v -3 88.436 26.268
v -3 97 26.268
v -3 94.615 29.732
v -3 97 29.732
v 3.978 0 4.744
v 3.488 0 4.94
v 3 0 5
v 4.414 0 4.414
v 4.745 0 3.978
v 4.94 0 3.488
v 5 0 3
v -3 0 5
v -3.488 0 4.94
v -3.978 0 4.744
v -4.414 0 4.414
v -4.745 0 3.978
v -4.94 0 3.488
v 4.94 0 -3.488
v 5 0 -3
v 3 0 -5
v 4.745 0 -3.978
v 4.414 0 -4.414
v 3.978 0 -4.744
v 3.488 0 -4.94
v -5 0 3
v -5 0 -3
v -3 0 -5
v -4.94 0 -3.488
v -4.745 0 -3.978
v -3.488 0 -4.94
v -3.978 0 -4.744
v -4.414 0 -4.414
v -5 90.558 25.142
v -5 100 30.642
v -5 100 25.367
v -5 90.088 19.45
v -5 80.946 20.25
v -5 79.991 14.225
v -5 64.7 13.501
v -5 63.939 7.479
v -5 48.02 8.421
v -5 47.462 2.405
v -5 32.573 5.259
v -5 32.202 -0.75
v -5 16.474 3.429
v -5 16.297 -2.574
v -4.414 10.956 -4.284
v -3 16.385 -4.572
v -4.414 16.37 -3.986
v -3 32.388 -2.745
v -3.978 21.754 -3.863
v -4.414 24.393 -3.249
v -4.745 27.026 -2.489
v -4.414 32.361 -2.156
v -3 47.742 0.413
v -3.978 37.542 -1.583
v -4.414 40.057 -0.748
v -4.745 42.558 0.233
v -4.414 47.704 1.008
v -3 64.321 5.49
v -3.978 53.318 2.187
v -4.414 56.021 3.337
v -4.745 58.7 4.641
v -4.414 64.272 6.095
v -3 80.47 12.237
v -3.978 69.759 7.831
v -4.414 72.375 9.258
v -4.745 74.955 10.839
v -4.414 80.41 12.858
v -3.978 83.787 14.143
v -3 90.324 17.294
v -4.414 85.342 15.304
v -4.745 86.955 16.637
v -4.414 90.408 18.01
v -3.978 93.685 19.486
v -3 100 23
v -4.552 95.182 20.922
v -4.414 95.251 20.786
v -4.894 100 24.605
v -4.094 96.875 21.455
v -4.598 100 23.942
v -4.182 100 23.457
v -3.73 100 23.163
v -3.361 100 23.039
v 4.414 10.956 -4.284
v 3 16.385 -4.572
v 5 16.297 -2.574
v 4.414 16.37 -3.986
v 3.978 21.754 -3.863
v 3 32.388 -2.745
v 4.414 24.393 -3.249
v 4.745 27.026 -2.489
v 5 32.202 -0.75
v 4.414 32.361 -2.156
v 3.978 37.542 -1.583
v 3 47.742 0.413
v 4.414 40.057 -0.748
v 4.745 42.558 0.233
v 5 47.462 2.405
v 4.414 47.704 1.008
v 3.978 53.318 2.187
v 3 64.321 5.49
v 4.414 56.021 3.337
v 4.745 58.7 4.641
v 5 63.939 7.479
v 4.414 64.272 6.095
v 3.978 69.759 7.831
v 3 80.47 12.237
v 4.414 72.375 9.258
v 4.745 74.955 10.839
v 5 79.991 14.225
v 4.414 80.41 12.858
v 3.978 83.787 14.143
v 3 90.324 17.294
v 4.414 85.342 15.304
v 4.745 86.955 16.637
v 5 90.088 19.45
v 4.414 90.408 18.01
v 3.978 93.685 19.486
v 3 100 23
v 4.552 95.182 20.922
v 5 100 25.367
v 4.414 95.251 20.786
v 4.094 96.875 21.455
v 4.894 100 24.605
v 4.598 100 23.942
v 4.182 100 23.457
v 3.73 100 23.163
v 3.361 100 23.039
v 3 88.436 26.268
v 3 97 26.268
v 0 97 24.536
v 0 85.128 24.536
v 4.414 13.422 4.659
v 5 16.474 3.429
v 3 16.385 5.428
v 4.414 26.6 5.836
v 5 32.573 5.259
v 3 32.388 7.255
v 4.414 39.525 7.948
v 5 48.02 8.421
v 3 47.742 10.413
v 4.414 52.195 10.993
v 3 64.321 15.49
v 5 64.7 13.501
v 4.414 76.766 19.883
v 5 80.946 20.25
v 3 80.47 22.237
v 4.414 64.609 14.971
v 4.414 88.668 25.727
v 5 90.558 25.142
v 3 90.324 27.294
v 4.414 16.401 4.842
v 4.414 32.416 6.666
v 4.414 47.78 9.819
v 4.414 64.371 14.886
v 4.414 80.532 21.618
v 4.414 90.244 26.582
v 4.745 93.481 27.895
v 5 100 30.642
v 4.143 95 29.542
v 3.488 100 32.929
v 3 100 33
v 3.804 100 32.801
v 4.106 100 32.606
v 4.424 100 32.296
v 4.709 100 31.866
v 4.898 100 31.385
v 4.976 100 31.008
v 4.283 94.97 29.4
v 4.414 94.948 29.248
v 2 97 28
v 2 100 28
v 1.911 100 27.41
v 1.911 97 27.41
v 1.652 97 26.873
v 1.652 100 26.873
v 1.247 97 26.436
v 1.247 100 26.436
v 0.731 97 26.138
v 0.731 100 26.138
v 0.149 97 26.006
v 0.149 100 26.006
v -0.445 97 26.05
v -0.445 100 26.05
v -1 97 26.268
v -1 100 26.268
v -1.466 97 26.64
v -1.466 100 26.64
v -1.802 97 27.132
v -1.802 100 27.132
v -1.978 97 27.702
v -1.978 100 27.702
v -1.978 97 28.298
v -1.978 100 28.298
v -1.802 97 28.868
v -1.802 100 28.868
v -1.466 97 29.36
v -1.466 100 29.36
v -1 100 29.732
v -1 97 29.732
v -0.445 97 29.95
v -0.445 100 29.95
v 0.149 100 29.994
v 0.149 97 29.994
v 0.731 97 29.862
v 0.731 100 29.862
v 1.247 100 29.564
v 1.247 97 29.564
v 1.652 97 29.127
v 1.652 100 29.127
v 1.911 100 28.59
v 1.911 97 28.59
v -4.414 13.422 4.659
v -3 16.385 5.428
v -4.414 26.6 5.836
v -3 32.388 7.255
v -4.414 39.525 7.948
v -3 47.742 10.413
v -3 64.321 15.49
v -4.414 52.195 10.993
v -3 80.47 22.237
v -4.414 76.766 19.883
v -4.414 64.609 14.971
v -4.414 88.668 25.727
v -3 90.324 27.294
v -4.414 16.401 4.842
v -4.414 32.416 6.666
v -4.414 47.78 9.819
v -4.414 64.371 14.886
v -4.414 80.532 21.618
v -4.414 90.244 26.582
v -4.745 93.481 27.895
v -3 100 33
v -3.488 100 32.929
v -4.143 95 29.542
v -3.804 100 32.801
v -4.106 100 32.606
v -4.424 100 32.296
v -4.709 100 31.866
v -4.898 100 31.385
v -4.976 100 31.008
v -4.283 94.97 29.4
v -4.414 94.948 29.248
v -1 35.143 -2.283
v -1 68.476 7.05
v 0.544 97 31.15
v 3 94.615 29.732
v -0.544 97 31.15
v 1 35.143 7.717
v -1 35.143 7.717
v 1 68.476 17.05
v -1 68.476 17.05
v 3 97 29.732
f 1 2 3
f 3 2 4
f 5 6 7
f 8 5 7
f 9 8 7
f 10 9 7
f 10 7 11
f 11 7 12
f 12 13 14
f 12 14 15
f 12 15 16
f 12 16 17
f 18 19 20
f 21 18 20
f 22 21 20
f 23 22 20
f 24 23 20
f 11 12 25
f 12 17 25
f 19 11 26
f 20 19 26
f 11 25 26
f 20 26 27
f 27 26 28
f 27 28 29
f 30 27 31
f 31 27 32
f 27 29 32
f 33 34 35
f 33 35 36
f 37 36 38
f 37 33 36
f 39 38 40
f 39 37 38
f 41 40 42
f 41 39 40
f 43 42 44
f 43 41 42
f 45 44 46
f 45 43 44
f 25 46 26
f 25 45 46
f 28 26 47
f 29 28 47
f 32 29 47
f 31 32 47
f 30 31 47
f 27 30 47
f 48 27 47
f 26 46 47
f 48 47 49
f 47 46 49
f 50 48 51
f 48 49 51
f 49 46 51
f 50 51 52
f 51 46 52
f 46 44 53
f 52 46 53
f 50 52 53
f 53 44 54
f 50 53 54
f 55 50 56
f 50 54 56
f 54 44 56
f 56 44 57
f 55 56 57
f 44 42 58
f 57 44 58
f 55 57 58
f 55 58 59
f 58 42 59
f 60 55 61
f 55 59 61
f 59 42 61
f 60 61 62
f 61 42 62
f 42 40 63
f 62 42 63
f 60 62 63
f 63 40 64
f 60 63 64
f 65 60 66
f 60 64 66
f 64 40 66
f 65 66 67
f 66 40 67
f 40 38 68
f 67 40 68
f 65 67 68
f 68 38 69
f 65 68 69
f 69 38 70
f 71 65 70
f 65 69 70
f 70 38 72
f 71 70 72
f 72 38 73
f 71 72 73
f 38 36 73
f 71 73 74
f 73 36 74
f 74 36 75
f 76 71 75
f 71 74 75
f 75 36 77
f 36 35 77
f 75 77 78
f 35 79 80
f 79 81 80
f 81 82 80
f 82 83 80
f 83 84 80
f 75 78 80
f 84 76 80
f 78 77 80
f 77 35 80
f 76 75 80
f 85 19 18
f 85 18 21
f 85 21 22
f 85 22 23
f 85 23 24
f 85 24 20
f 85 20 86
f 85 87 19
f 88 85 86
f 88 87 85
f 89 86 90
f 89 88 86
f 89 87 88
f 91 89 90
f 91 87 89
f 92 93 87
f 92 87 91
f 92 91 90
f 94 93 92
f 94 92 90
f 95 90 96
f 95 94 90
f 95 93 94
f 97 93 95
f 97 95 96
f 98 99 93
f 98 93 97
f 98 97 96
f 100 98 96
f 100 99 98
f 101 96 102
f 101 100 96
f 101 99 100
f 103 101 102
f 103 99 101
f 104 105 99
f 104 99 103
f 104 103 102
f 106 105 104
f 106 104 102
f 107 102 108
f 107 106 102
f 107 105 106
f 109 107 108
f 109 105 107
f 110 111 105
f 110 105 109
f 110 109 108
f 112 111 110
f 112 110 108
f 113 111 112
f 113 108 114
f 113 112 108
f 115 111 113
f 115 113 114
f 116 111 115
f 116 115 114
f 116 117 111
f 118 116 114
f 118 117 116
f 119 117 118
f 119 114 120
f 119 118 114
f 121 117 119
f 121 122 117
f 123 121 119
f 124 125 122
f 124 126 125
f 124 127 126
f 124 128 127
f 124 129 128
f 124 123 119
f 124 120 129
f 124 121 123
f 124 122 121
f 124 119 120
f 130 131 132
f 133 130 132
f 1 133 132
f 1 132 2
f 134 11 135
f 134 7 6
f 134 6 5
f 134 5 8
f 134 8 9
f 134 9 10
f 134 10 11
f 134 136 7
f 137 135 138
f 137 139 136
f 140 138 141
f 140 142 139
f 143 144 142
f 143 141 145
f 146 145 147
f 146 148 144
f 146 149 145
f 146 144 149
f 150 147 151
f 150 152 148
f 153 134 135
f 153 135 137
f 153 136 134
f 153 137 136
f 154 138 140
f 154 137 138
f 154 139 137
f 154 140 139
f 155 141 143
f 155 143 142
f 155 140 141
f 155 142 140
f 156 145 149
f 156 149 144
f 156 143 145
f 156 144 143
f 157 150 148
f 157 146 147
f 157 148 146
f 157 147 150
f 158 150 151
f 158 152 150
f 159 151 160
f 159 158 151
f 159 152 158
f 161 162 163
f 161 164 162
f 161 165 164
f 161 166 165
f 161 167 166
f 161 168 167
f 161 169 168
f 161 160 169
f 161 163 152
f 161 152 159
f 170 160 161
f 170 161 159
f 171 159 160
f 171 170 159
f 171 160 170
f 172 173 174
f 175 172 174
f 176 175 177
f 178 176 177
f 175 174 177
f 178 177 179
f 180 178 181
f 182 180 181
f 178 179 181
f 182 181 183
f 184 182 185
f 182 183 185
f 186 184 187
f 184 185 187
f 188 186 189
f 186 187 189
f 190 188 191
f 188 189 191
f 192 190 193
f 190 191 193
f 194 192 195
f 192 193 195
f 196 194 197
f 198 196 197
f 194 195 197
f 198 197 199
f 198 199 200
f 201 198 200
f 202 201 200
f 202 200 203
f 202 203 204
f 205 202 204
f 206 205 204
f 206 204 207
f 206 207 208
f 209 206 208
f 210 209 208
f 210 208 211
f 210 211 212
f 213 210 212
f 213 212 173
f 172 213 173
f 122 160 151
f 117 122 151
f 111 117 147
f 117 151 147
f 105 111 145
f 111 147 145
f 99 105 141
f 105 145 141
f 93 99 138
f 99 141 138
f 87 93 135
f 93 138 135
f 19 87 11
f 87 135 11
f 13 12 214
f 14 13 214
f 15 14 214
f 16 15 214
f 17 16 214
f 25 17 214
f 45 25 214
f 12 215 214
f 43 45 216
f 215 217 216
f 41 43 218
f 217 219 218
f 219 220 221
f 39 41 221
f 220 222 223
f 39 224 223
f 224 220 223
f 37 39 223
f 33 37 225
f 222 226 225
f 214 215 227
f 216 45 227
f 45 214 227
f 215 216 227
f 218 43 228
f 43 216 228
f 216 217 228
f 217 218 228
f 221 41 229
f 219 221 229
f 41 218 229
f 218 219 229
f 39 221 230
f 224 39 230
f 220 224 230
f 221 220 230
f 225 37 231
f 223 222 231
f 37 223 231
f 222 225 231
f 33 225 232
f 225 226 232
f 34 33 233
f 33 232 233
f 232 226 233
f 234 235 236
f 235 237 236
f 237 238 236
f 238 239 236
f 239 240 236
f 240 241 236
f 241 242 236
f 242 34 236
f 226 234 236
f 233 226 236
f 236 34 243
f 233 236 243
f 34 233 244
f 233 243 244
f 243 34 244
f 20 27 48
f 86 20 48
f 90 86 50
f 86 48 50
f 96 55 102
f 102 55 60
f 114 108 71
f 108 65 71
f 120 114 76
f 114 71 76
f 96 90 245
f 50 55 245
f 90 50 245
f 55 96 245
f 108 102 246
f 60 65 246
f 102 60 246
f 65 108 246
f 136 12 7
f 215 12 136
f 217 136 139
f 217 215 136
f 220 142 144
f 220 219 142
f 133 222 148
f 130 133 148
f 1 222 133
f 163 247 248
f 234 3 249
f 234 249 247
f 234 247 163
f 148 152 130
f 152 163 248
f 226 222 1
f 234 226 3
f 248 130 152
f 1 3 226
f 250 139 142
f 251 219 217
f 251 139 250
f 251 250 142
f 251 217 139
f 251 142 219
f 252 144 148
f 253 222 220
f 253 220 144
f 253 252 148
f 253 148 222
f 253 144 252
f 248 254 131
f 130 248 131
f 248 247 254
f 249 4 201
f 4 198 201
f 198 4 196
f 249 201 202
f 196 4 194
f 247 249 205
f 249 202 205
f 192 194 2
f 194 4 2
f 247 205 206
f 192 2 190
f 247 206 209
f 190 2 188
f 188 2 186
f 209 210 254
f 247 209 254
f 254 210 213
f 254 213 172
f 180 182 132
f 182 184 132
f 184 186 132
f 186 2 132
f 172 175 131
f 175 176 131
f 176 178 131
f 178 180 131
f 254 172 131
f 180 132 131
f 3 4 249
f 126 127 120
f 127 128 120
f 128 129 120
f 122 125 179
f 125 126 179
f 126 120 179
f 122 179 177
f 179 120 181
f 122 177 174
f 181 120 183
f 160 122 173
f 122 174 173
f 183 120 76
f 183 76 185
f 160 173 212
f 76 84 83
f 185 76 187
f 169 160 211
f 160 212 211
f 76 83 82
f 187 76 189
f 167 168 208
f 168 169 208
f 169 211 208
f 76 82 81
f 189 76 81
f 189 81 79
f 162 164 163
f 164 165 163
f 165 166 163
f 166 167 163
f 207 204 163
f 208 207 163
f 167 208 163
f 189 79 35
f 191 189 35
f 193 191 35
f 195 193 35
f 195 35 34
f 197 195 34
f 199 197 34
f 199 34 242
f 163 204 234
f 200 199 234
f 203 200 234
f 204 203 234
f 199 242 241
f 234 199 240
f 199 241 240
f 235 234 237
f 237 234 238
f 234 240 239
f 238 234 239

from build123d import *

# Parameters (mm, degrees)
SWEEP1_START          = -5
SWEEP1_DEPTH          = 10
CUT_EXTRUDE1_DEPTH    = 103.581674908
F_4_0MM_DOWEL_HOLE1_D = 4
FILLET2_R             = 2


# Read off the part's stored shape, not the designer's step: Sweep1
with BuildPart() as part:
    # Sweep1 outline → Sweep1 (new body)
    with BuildSketch(Plane.YZ.offset(SWEEP1_START)):
        with BuildLine():
            add(Edge.make_bspline(
                [(0, 5), (36.047601353, 4.409009522), (69.380934685, 13.742342856), (100, 33)],
                knots=[0, 0, 0, 0, 1, 1, 1, 1], degree=3))
            Line((0, 5), (0, -5))
            add(Edge.make_bspline(
                [(0, -5), (36.047601353, -5.590990478), (69.380934685, 3.742342856), (100, 23)],
                knots=[0, 0, 0, 0, 1, 1, 1, 1], degree=3))
            Line((100, 23), (100, 33))
        make_face()
    extrude(amount=SWEEP1_DEPTH)

    # Sketch3 → Cut-Extrude1 (cut, through all)
    with BuildSketch(Plane(origin=(0, 97, 0), x_dir=(1, 0, 0), z_dir=(0, 1, 0))):
        Polygon((0, -24.535898385), (-3, -26.267949192), (-3, -29.732050808), (0, -31.464101615), (3, -29.732050808), (3, -26.267949192), align=None)
    extrude(amount=-CUT_EXTRUDE1_DEPTH, mode=Mode.SUBTRACT)

    # Ø4.0mm Dowel Hole1 (through all)
    with Locations(Plane(origin=(0, 97, 0), x_dir=(-1, 0, 0), z_dir=(0, -1, 0))):
        with Locations((0, -28)):
            Hole(F_4_0MM_DOWEL_HOLE1_D / 2)

    # Fillet2
    fillet2_edges = [part.edges().sort_by_distance(p)[0] for p in [
        (-5, 52.035701014, 11.556757142),
        (5, 52.035701014, 11.556757142),
        (-5, 52.035701014, 1.556757142),
        (5, 52.035701014, 1.556757142),
    ]]
    fillet(fillet2_edges, radius=FILLET2_R - 0.0001)  # a hair under: the kernel refuses the full size


solid = part.part
